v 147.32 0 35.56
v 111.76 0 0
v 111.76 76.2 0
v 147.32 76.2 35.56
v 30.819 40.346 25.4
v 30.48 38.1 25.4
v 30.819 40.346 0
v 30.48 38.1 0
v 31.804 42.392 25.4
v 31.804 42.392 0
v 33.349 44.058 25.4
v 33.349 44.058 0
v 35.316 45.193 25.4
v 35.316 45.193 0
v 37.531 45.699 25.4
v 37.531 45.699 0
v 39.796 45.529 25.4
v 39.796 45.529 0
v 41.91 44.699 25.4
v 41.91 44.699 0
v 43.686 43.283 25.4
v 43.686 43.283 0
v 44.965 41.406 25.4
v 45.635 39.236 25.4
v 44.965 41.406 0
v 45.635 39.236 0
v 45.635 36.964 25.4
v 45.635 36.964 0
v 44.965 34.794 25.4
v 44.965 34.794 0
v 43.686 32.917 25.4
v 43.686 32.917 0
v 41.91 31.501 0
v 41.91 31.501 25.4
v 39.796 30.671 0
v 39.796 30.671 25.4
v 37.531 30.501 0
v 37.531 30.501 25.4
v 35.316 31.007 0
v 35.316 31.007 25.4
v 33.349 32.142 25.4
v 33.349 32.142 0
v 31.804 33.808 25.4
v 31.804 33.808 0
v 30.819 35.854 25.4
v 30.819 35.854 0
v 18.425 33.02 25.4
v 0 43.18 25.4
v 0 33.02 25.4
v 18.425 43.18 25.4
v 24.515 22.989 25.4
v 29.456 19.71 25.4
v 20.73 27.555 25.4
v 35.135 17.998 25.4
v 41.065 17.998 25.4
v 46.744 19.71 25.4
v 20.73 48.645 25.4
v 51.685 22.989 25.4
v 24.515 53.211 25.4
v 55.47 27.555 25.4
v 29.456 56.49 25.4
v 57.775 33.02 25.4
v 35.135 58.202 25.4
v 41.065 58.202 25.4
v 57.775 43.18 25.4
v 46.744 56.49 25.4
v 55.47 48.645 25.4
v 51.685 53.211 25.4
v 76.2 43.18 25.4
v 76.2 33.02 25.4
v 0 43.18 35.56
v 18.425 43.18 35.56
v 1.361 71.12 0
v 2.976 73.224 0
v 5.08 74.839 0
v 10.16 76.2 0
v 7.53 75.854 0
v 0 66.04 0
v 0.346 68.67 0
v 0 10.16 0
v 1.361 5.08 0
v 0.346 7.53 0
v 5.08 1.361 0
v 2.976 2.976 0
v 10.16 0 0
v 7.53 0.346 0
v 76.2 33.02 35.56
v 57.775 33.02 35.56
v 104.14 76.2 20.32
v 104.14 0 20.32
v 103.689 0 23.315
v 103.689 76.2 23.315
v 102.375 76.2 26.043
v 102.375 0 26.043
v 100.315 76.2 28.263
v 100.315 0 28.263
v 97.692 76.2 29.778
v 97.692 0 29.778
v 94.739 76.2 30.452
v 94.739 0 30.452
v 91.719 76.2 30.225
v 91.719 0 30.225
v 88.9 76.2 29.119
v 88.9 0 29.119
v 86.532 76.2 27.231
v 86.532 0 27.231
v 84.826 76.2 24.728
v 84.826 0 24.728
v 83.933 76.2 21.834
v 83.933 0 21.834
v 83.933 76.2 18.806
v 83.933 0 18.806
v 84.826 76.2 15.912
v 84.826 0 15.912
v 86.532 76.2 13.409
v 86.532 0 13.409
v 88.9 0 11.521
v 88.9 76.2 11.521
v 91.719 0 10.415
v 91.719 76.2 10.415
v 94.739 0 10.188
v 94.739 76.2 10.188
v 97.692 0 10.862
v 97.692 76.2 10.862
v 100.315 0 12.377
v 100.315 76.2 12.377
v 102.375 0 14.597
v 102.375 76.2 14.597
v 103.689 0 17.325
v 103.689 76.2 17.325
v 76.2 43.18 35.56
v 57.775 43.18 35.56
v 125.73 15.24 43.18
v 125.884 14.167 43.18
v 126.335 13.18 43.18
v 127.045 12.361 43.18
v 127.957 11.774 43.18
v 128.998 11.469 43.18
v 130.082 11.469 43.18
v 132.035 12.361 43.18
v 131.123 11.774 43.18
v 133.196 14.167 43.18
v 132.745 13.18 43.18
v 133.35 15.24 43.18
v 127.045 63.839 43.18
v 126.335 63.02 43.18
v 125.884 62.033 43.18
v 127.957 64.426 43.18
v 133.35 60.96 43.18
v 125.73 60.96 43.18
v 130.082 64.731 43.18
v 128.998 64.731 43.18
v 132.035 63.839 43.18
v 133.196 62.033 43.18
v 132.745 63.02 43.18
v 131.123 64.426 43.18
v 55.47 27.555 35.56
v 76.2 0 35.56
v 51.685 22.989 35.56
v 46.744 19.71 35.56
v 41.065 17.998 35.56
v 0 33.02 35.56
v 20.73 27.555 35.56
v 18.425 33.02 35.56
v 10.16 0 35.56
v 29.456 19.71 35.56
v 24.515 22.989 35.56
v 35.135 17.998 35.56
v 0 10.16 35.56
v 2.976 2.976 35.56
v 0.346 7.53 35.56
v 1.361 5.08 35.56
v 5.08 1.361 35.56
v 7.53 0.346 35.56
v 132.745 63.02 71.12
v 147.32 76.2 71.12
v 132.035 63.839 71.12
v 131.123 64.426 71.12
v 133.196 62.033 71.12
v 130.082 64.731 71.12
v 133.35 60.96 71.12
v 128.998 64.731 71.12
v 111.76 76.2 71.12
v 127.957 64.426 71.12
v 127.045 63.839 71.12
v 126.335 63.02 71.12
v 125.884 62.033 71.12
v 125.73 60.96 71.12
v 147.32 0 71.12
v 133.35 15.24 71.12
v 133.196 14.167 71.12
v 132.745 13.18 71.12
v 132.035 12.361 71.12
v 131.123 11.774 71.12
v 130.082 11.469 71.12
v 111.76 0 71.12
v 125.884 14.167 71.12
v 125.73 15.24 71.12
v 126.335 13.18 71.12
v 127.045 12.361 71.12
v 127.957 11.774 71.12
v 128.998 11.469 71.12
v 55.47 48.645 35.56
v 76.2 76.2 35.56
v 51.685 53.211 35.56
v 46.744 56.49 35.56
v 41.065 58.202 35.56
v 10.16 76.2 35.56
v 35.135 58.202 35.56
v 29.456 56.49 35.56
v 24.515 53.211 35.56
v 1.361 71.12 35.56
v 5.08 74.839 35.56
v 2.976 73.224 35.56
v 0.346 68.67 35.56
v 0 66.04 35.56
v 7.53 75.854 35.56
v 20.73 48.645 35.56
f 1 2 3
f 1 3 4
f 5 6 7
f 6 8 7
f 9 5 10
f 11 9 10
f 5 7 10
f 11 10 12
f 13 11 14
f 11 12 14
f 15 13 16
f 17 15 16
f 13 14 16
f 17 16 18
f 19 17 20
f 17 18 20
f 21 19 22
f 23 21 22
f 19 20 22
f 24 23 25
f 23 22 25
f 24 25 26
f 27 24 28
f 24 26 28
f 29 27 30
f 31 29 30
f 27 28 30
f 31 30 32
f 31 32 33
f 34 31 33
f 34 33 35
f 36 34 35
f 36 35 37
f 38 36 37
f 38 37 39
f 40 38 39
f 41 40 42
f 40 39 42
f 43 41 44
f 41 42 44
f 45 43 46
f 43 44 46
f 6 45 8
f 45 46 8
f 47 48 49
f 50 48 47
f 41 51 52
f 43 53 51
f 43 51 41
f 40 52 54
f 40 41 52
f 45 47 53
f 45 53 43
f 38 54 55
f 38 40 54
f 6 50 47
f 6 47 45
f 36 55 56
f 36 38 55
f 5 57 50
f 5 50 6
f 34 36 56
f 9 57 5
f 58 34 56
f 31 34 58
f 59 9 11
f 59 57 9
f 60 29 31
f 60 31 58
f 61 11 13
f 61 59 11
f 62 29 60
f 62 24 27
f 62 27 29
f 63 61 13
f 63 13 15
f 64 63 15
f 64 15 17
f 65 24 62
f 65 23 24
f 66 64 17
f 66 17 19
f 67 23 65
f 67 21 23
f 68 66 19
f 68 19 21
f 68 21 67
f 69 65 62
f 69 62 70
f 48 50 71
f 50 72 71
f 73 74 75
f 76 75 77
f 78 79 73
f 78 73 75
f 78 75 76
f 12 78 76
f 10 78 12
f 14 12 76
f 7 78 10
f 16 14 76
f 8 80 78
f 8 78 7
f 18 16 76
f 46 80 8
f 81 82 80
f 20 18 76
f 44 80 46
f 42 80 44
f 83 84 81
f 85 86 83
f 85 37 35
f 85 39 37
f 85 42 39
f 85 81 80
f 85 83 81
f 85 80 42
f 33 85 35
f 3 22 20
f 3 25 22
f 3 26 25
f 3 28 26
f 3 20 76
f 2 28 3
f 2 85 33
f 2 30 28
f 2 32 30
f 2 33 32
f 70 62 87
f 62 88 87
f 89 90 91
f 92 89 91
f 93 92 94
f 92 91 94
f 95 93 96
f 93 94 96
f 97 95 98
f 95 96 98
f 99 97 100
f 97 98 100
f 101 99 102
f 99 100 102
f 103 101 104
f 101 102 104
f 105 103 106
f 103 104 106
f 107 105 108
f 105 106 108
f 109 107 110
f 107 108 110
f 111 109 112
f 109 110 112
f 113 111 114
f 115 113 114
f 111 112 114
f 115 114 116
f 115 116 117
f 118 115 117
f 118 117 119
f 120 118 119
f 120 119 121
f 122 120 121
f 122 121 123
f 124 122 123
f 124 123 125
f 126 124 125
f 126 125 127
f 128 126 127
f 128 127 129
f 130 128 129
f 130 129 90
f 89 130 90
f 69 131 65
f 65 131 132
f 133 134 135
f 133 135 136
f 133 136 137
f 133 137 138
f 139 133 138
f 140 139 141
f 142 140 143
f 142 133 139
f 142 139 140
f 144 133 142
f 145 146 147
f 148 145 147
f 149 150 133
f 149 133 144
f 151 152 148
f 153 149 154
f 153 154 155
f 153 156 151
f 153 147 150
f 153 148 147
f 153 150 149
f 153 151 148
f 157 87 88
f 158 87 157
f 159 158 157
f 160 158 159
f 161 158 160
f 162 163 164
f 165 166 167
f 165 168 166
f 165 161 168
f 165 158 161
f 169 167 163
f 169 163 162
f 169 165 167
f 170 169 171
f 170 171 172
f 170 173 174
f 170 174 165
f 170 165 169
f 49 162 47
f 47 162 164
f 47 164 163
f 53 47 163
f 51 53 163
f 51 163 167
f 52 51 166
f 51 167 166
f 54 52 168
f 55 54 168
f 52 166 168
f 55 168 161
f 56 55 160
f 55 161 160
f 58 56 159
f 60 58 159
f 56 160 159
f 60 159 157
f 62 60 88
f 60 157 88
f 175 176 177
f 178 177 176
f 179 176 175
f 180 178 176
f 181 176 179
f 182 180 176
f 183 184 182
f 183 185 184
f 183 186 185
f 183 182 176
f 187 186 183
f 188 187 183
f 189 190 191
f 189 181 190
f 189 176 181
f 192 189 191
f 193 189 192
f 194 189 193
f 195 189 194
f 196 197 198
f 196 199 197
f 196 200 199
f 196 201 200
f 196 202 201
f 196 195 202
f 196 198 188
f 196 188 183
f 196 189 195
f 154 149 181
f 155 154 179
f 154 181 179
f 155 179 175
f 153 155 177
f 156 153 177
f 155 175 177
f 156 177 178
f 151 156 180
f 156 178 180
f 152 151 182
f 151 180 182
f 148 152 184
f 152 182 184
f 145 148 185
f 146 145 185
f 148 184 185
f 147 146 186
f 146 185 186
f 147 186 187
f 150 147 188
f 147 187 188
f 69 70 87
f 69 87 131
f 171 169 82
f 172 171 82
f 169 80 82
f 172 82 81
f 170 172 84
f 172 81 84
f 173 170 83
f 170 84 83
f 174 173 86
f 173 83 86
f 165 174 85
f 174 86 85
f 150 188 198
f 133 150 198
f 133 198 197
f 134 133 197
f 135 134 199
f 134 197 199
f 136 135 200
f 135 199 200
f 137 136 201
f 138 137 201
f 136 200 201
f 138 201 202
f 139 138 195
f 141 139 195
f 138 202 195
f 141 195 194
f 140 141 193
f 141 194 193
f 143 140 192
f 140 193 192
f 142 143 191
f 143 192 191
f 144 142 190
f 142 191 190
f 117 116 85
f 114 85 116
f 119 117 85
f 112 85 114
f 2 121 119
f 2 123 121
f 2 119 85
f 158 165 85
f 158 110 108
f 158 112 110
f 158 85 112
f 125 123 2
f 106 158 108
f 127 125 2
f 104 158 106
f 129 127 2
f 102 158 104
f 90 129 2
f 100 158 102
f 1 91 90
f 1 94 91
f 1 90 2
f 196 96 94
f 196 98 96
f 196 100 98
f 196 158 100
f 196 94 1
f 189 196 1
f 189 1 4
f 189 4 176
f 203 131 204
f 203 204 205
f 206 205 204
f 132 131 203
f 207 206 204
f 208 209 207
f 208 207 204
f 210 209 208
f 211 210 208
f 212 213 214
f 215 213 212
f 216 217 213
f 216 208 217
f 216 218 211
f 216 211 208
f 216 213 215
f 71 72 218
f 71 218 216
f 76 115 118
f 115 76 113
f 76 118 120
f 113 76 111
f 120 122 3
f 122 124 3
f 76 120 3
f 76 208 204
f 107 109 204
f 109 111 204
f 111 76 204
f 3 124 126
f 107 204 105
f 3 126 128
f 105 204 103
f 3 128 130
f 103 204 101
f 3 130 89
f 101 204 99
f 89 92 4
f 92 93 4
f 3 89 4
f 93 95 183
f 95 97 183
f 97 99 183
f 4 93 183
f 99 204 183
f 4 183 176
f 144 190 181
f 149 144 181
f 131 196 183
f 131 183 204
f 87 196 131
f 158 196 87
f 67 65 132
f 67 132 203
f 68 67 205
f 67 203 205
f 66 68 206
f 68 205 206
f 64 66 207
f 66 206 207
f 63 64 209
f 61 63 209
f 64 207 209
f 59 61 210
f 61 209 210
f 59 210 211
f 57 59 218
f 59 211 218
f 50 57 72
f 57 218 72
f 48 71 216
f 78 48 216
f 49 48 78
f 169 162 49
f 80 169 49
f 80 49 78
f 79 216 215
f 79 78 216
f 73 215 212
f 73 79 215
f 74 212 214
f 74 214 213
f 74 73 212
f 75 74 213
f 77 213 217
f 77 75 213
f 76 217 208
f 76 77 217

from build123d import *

# Parameters (mm, degrees)
F1_DEPTH       = 76.2
F3_DEPTH       = 27.94
F4_R           = 10.16
F5_DEPTH       = 76.201
F7_DEPTH       = 10.16
F8_D           = 15.24
F8_CBORE_D     = 40.64
F8_CBORE_DEPTH = 10.16
F9_R           = 10.16


with BuildPart() as f1:
    # F0 (on Front) → F1 (new body)
    with BuildSketch(Plane.XZ):
        Polygon((0, 35.56), (0, 0), (111.76, 0), (147.32, 35.56), (147.32, 71.12), (111.76, 71.12), (76.2, 35.56), align=None)
    extrude(amount=-F1_DEPTH)

    # F2 (on face) → F3 (cut)
    with BuildSketch(Plane.XY.offset(71.12)):
        with BuildLine():
            ThreePointArc((125.73, 15.24), (129.54, 11.43), (133.35, 15.24))
            Line((133.35, 15.24), (133.35, 60.96))
            ThreePointArc((133.35, 60.96), (129.54, 64.77), (125.73, 60.96))
            Line((125.73, 60.96), (125.73, 15.24))
        make_face()
    extrude(amount=-F3_DEPTH, mode=Mode.SUBTRACT)

    # F4 (on face) → F5 (cut, through all)
    with BuildSketch(Plane.XZ):
        with Locations((93.98, 20.32)):
            Circle(F4_R)
    extrude(amount=-F5_DEPTH, mode=Mode.SUBTRACT)

    # F6 (on face) → F7 (cut)
    with BuildSketch(Plane.XY.offset(35.56)):
        with BuildLine():
            ThreePointArc((18.425245, 33.02), (17.78, 38.1), (18.425245, 43.18))
            Line((18.425245, 43.18), (0, 43.18))
            Line((0, 43.18), (0, 33.02))
            Line((0, 33.02), (18.425245, 33.02))
        make_face()
        with BuildLine():
            ThreePointArc((57.774755, 43.18), (58.258043, 40.660407), (58.42, 38.1))
            ThreePointArc((58.42, 38.1), (58.258043, 35.539593), (57.774755, 33.02))
            Line((57.774755, 33.02), (76.2, 33.02))
            Line((76.2, 33.02), (76.2, 43.18))
            Line((76.2, 43.18), (57.774755, 43.18))
        make_face()
    extrude(amount=-F7_DEPTH, mode=Mode.SUBTRACT)

    # F8 (through all)
    with Locations(Plane.XY.offset(35.56)):
        with Locations((38.1, 38.1)):
            CounterBoreHole(F8_D / 2, F8_CBORE_D / 2, F8_CBORE_DEPTH)

    # F9
    f9_edges = [f1.edges().sort_by_distance(p)[0] for p in [
        (0, 0, 17.78),
        (0, 76.2, 17.78),
    ]]
    fillet(f9_edges, radius=F9_R)


solid = f1.part
